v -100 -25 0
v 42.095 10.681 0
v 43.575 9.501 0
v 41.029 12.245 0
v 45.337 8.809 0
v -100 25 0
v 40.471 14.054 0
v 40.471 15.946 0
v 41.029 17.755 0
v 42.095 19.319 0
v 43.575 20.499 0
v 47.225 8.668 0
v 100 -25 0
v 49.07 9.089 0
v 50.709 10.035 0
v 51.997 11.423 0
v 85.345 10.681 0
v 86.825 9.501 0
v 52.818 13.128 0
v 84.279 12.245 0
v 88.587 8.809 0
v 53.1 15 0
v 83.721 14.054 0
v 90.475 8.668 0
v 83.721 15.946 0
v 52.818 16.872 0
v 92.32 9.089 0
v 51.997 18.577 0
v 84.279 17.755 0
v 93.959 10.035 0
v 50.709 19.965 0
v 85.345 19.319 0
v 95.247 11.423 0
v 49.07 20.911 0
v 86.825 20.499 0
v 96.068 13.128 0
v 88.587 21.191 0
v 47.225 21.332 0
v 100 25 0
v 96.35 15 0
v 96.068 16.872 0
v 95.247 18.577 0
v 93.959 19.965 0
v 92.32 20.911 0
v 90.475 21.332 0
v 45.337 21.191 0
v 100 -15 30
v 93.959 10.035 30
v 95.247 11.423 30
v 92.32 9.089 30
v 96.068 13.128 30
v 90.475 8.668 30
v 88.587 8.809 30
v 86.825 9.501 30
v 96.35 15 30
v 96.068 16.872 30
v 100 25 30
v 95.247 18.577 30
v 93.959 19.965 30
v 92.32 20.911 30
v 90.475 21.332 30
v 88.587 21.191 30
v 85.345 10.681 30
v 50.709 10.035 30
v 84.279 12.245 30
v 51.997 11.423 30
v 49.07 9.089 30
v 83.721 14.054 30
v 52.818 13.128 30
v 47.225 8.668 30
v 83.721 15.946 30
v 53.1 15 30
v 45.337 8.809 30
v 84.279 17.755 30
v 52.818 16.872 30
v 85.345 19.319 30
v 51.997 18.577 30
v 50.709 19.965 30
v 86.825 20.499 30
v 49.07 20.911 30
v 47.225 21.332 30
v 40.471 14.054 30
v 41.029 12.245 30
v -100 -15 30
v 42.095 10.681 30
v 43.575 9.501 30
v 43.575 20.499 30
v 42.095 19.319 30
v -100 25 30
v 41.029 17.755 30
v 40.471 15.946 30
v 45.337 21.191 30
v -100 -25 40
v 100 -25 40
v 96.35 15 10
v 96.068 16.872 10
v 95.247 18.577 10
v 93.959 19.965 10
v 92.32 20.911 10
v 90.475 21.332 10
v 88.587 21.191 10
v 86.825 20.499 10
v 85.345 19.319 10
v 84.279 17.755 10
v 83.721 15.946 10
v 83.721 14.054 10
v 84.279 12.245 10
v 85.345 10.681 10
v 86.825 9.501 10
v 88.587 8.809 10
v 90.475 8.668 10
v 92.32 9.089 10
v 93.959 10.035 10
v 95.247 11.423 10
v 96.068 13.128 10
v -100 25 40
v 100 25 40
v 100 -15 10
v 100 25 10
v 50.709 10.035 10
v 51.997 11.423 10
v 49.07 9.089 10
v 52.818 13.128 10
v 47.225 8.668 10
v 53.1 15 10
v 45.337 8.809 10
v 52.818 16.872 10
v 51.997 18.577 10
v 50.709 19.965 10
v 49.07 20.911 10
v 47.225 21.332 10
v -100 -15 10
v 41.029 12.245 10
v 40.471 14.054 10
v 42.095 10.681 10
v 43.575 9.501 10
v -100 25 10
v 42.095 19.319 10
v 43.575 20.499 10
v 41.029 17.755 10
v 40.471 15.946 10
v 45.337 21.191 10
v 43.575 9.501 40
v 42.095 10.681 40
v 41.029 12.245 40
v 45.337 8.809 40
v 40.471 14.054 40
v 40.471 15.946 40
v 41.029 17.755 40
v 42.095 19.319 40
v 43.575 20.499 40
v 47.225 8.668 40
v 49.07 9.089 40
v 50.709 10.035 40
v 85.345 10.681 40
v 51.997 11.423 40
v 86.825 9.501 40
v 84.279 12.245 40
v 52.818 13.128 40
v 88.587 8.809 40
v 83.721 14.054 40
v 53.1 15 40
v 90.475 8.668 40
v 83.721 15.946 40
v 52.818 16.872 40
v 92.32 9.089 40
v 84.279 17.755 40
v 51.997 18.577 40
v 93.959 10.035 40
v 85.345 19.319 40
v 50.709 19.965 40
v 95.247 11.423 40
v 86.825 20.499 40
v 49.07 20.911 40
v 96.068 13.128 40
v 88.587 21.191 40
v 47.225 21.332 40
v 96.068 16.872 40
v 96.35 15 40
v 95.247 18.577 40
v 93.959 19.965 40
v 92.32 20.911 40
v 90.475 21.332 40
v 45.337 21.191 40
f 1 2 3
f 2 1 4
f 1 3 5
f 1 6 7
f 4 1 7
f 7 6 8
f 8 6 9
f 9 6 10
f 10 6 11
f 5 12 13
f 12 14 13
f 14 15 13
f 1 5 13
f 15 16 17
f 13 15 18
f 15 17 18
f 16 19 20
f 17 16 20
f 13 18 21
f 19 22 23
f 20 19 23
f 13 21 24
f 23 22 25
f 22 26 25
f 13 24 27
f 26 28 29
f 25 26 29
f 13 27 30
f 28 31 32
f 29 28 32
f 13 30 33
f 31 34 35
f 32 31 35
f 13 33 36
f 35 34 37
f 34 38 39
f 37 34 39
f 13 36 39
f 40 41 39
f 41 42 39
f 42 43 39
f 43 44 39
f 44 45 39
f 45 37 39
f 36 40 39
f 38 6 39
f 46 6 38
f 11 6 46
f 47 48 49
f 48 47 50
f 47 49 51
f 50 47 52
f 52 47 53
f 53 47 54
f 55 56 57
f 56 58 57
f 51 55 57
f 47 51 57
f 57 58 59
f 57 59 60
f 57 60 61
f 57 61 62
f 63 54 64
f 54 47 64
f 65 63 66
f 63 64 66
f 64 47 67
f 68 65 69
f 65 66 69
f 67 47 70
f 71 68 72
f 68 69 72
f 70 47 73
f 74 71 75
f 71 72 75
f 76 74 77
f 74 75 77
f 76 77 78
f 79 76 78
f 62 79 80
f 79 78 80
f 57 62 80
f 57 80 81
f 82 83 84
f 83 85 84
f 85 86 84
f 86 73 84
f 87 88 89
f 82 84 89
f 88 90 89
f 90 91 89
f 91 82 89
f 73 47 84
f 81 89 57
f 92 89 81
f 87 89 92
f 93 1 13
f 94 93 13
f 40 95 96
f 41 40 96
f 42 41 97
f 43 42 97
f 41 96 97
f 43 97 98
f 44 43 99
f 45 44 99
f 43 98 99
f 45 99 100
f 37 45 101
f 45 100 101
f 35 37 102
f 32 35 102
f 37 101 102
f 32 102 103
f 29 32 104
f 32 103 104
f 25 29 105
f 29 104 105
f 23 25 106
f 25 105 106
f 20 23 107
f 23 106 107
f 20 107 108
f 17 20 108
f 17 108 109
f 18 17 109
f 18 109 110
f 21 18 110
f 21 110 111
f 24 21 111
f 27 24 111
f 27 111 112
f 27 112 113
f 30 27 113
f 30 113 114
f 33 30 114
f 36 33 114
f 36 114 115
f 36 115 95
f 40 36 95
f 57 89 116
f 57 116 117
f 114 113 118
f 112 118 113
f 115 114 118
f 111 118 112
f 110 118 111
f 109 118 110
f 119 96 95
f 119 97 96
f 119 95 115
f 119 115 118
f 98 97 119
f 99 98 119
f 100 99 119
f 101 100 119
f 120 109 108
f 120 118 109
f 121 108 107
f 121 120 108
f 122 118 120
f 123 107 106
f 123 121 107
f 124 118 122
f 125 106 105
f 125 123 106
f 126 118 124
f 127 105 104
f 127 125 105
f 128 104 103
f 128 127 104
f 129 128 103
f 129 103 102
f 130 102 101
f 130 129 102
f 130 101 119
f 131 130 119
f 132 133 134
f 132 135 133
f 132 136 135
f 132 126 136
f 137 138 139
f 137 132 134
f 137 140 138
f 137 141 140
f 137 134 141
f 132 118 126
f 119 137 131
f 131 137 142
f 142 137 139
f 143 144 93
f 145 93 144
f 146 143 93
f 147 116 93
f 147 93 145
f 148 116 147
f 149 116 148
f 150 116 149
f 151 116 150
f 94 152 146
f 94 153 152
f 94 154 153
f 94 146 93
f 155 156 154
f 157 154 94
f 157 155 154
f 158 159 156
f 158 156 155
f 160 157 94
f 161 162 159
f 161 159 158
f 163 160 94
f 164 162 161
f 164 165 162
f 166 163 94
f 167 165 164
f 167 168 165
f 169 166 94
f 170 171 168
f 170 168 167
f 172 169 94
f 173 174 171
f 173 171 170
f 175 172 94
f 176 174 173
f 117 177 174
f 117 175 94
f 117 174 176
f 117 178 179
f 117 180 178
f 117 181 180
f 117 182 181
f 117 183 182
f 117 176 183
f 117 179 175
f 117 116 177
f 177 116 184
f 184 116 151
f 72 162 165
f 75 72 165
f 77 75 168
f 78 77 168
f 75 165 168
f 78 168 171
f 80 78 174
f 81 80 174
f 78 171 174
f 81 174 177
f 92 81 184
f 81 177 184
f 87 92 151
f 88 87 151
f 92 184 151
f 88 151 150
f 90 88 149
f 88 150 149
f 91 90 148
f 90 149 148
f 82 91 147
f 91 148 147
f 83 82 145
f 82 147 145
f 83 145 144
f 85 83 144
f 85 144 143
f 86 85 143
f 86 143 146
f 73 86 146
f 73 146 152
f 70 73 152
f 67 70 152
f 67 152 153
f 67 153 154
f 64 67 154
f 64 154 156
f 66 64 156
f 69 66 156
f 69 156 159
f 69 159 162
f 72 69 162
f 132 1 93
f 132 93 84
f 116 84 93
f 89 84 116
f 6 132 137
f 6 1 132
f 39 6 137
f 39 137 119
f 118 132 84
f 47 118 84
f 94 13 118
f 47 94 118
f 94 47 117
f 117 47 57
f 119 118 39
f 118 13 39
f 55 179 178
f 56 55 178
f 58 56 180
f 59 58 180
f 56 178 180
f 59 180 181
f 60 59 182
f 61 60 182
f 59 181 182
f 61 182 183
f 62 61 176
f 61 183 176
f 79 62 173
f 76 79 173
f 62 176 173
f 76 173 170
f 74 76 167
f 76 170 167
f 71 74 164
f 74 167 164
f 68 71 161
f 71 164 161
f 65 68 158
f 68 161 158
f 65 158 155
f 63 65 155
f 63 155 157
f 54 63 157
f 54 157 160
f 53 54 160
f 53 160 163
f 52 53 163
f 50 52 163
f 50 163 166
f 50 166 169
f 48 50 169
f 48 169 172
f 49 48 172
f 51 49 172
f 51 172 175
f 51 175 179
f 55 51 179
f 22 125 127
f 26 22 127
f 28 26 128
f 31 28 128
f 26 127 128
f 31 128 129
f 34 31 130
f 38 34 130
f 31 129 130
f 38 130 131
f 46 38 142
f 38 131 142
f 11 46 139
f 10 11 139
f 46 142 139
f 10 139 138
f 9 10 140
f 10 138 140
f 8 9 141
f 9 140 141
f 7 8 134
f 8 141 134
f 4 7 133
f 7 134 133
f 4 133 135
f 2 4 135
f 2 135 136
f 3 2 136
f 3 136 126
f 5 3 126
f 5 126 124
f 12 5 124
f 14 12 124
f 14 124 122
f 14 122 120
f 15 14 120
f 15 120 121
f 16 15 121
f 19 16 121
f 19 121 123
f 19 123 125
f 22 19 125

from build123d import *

# Parameters (mm, degrees)
SKETCH1_W           = 200
SKETCH1_H           = 50
BOSS_EXTRUDE1_DEPTH = 40
SKETCH2_R           = 6.35
CUT_EXTRUDE1_DEPTH  = 111.566721937
SKETCH4_W           = 20
SKETCH4_H           = 40
CUT_EXTRUDE2_DEPTH  = 206.48722588


with BuildPart() as part:
    # Sketch1 → Boss-Extrude1 (new body)
    with BuildSketch(Plane.XY):
        Rectangle(SKETCH1_W, SKETCH1_H)
    extrude(amount=BOSS_EXTRUDE1_DEPTH)

    # Sketch2 → Cut-Extrude1 (cut, through all)
    with BuildSketch(Plane.XY.offset(40)):
        with Locations((90, 15)):
            Circle(SKETCH2_R)
        with Locations((46.75, 15)):
            Circle(SKETCH2_R)
    extrude(amount=-CUT_EXTRUDE1_DEPTH, mode=Mode.SUBTRACT)

    # Sketch4 → Cut-Extrude2 (cut, through all)
    with BuildSketch(Plane.ZY.offset(100)):
        with Locations((20, 5)):
            Rectangle(SKETCH4_W, SKETCH4_H)
    extrude(amount=-CUT_EXTRUDE2_DEPTH, mode=Mode.SUBTRACT)


solid = part.part
